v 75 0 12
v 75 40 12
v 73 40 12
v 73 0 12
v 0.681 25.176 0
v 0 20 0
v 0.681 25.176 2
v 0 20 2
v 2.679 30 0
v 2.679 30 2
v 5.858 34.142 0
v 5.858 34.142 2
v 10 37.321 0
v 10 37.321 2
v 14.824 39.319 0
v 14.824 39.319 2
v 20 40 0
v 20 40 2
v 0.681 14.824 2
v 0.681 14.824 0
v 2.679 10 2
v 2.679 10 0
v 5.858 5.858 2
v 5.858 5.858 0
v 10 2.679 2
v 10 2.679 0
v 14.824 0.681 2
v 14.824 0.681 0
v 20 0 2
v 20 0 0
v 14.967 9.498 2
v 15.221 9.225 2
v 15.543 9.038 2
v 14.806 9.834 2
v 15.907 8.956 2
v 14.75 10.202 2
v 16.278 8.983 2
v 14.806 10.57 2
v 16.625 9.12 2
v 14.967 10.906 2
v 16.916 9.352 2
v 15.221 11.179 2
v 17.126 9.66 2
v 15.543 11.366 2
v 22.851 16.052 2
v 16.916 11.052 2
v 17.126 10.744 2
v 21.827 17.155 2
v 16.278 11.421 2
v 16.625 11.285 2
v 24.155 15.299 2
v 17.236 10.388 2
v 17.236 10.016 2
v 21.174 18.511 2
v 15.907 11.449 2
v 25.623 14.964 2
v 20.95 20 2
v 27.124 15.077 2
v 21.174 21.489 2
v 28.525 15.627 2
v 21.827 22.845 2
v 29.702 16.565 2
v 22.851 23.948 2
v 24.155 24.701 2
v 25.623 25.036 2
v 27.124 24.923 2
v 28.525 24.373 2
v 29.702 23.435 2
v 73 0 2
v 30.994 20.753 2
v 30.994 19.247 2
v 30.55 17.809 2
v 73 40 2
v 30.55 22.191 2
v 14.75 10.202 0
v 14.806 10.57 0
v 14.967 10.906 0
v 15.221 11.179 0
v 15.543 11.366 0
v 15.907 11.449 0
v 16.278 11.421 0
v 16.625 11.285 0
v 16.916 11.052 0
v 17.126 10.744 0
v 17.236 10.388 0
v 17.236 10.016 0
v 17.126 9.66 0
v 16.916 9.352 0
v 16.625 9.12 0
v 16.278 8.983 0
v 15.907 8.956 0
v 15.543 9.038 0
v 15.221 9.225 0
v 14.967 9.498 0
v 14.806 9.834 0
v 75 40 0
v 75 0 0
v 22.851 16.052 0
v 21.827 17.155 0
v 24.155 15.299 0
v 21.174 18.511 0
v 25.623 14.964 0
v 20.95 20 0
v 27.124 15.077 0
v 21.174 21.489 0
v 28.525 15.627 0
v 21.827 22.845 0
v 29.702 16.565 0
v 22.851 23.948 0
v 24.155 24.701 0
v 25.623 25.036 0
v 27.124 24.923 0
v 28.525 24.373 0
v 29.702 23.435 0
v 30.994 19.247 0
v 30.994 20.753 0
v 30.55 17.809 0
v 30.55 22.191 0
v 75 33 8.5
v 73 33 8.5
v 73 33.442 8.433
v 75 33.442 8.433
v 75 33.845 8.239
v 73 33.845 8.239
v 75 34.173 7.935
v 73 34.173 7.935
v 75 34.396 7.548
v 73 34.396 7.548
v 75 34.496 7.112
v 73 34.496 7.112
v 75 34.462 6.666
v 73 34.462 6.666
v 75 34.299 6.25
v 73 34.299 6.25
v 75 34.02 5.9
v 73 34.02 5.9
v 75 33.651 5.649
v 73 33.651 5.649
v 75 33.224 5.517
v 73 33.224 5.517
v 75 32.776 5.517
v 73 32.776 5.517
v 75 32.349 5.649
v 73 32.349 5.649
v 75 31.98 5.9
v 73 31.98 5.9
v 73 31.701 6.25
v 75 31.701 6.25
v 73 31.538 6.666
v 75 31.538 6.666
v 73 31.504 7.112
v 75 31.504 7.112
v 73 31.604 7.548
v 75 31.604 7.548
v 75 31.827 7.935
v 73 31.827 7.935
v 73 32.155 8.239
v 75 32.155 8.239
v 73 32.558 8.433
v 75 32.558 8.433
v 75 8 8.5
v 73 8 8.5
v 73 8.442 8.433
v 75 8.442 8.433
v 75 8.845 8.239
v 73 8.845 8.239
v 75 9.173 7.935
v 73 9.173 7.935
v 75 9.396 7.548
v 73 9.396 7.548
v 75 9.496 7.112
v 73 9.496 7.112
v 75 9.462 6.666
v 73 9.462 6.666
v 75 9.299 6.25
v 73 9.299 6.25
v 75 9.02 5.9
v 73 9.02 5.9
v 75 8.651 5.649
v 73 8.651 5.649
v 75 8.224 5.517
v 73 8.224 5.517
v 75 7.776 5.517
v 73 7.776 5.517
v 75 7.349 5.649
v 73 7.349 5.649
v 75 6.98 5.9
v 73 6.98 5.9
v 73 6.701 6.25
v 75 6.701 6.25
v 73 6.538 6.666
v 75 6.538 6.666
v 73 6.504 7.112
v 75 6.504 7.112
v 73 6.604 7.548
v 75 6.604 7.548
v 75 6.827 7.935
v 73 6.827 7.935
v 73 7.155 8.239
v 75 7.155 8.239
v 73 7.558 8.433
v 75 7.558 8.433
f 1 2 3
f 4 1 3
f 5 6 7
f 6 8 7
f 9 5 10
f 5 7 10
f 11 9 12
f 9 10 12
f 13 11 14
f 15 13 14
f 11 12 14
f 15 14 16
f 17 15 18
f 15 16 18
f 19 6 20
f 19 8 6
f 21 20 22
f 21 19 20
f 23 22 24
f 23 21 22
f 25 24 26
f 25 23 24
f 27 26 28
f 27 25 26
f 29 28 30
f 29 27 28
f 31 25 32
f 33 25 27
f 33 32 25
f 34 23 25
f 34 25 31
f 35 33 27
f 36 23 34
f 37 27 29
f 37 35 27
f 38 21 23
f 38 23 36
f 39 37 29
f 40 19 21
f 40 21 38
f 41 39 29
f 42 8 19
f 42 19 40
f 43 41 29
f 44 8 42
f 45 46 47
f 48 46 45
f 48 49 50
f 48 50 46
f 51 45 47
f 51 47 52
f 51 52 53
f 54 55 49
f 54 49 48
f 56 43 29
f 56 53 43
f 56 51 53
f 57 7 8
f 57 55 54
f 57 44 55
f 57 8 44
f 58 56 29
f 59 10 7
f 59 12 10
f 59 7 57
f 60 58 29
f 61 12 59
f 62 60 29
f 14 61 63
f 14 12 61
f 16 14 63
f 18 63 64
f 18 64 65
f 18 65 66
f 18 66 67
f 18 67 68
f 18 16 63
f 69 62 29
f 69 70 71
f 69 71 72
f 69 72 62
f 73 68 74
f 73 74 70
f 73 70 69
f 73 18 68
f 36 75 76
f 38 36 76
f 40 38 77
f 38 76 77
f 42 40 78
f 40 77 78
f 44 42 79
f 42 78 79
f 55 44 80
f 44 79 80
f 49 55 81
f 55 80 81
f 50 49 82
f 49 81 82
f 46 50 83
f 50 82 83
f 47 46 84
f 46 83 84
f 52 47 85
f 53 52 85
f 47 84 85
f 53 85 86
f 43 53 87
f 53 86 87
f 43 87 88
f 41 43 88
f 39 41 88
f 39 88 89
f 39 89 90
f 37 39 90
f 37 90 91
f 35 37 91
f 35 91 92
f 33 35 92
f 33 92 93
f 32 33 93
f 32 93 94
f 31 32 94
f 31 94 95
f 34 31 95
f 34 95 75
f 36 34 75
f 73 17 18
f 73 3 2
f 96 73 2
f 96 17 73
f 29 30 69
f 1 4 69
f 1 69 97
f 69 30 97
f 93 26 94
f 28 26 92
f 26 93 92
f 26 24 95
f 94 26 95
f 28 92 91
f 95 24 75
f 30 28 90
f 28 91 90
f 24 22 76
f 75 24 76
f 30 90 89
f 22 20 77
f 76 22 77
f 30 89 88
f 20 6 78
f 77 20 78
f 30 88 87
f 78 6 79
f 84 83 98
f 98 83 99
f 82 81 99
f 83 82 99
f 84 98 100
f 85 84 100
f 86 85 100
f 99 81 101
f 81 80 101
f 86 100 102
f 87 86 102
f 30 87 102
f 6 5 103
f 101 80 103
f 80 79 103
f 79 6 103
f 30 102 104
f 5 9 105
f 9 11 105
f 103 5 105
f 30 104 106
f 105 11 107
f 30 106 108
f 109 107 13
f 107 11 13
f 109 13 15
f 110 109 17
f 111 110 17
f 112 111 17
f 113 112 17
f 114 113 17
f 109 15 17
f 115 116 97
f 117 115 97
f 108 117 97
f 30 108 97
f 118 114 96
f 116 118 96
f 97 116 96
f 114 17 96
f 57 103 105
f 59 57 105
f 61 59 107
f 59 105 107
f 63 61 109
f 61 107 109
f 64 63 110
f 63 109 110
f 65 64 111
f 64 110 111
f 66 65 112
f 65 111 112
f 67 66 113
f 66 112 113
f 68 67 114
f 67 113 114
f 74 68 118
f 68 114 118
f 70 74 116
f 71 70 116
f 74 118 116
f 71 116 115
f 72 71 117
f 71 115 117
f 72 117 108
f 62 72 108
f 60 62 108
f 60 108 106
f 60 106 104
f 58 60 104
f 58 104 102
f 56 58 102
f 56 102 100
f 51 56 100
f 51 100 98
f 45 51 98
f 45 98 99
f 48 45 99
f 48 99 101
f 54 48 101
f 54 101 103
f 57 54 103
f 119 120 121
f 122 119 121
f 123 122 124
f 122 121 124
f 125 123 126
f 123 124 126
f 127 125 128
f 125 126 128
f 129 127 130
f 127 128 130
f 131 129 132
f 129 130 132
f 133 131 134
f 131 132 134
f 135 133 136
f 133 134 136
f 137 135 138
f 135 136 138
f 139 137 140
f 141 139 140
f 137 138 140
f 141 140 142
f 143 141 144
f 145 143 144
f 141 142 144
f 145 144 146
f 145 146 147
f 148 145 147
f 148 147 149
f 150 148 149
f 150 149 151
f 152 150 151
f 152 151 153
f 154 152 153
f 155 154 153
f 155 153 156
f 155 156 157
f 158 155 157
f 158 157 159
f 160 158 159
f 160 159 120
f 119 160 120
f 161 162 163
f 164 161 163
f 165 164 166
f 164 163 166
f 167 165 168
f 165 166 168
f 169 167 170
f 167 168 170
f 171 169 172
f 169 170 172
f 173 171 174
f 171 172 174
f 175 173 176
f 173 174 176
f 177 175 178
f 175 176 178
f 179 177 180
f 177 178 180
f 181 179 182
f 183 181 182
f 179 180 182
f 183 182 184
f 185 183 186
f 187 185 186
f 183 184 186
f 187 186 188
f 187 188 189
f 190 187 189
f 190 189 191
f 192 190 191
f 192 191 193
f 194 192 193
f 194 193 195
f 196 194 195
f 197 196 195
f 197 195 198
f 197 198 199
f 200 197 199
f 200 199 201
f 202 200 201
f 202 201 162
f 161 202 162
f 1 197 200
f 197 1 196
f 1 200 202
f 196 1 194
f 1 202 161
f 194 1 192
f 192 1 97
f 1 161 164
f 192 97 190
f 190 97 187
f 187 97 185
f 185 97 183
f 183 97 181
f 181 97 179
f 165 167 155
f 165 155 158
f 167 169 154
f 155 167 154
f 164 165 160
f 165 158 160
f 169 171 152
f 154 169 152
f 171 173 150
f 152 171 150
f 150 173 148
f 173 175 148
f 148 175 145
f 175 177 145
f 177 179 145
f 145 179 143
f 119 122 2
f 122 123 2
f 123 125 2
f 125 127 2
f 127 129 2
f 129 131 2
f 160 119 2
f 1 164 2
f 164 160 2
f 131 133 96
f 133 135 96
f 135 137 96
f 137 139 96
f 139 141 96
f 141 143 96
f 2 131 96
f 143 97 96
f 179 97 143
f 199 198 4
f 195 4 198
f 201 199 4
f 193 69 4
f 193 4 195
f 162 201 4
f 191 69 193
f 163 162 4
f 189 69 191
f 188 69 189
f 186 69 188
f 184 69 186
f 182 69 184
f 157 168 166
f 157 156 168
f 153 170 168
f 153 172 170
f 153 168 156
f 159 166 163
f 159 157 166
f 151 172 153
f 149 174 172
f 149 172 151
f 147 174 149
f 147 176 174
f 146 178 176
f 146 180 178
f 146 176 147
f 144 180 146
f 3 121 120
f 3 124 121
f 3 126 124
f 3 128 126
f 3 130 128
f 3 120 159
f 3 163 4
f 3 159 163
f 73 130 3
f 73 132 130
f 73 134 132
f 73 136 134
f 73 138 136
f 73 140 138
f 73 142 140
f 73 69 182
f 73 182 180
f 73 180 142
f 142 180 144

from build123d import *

# Parameters (mm, degrees)
SKETCH_2_W          = 75
SKETCH_2_H          = 40
EXTRUDE_1_DEPTH     = 2
SKETCH_3_R          = 5.05
SKETCH_3_R_2        = 1.25
CUT_EXTRUDE_1_DEPTH = 86.023526156
FILLET_1_R          = 20
SKETCH_7_W          = 2
SKETCH_7_H          = 40
EXTRUDE_3_DEPTH     = 12
SKETCH_8_R          = 1.5
CUT_EXTRUDE_2_DEPTH = 10


with BuildPart() as part:
    # 草图2 → 凸台-拉伸1 (new body)
    with BuildSketch(Plane.XY):
        with Locations((37.5, 20)):
            Rectangle(SKETCH_2_W, SKETCH_2_H)
    extrude(amount=EXTRUDE_1_DEPTH)

    # 草图3 → 切除-拉伸1 (cut, through all)
    with BuildSketch(Plane(origin=(0, 0, 0), x_dir=(-1, 0, 0), z_dir=(0, 0, -1))):
        with Locations((-26, 20)):
            Circle(SKETCH_3_R)
        with Locations((-16, 10.202041029)):
            Circle(SKETCH_3_R_2)
    extrude(amount=-CUT_EXTRUDE_1_DEPTH, mode=Mode.SUBTRACT)

    # 圆角1
    fillet_1_edges = [part.edges().sort_by_distance(p)[0] for p in [
        (0, 40, 1),
        (0, 0, 1),
    ]]
    fillet(fillet_1_edges, radius=FILLET_1_R - 0.0001)  # a hair under: the kernel refuses the full size

    # 草图7 → 凸台-拉伸3 (add)
    with BuildSketch(Plane(origin=(0, 0, 0), x_dir=(-1, 0, 0), z_dir=(0, 0, -1))):
        with Locations((-74, 20)):
            Rectangle(SKETCH_7_W, SKETCH_7_H)
    extrude(amount=-EXTRUDE_3_DEPTH)

    # 草图8 → 切除-拉伸2 (cut)
    with BuildSketch(Plane.ZY.offset(-73)):
        with Locations((7, 33)):
            Circle(SKETCH_8_R)
        with Locations((7, 8)):
            Circle(SKETCH_8_R)
    extrude(amount=-CUT_EXTRUDE_2_DEPTH, mode=Mode.SUBTRACT)


solid = part.part
